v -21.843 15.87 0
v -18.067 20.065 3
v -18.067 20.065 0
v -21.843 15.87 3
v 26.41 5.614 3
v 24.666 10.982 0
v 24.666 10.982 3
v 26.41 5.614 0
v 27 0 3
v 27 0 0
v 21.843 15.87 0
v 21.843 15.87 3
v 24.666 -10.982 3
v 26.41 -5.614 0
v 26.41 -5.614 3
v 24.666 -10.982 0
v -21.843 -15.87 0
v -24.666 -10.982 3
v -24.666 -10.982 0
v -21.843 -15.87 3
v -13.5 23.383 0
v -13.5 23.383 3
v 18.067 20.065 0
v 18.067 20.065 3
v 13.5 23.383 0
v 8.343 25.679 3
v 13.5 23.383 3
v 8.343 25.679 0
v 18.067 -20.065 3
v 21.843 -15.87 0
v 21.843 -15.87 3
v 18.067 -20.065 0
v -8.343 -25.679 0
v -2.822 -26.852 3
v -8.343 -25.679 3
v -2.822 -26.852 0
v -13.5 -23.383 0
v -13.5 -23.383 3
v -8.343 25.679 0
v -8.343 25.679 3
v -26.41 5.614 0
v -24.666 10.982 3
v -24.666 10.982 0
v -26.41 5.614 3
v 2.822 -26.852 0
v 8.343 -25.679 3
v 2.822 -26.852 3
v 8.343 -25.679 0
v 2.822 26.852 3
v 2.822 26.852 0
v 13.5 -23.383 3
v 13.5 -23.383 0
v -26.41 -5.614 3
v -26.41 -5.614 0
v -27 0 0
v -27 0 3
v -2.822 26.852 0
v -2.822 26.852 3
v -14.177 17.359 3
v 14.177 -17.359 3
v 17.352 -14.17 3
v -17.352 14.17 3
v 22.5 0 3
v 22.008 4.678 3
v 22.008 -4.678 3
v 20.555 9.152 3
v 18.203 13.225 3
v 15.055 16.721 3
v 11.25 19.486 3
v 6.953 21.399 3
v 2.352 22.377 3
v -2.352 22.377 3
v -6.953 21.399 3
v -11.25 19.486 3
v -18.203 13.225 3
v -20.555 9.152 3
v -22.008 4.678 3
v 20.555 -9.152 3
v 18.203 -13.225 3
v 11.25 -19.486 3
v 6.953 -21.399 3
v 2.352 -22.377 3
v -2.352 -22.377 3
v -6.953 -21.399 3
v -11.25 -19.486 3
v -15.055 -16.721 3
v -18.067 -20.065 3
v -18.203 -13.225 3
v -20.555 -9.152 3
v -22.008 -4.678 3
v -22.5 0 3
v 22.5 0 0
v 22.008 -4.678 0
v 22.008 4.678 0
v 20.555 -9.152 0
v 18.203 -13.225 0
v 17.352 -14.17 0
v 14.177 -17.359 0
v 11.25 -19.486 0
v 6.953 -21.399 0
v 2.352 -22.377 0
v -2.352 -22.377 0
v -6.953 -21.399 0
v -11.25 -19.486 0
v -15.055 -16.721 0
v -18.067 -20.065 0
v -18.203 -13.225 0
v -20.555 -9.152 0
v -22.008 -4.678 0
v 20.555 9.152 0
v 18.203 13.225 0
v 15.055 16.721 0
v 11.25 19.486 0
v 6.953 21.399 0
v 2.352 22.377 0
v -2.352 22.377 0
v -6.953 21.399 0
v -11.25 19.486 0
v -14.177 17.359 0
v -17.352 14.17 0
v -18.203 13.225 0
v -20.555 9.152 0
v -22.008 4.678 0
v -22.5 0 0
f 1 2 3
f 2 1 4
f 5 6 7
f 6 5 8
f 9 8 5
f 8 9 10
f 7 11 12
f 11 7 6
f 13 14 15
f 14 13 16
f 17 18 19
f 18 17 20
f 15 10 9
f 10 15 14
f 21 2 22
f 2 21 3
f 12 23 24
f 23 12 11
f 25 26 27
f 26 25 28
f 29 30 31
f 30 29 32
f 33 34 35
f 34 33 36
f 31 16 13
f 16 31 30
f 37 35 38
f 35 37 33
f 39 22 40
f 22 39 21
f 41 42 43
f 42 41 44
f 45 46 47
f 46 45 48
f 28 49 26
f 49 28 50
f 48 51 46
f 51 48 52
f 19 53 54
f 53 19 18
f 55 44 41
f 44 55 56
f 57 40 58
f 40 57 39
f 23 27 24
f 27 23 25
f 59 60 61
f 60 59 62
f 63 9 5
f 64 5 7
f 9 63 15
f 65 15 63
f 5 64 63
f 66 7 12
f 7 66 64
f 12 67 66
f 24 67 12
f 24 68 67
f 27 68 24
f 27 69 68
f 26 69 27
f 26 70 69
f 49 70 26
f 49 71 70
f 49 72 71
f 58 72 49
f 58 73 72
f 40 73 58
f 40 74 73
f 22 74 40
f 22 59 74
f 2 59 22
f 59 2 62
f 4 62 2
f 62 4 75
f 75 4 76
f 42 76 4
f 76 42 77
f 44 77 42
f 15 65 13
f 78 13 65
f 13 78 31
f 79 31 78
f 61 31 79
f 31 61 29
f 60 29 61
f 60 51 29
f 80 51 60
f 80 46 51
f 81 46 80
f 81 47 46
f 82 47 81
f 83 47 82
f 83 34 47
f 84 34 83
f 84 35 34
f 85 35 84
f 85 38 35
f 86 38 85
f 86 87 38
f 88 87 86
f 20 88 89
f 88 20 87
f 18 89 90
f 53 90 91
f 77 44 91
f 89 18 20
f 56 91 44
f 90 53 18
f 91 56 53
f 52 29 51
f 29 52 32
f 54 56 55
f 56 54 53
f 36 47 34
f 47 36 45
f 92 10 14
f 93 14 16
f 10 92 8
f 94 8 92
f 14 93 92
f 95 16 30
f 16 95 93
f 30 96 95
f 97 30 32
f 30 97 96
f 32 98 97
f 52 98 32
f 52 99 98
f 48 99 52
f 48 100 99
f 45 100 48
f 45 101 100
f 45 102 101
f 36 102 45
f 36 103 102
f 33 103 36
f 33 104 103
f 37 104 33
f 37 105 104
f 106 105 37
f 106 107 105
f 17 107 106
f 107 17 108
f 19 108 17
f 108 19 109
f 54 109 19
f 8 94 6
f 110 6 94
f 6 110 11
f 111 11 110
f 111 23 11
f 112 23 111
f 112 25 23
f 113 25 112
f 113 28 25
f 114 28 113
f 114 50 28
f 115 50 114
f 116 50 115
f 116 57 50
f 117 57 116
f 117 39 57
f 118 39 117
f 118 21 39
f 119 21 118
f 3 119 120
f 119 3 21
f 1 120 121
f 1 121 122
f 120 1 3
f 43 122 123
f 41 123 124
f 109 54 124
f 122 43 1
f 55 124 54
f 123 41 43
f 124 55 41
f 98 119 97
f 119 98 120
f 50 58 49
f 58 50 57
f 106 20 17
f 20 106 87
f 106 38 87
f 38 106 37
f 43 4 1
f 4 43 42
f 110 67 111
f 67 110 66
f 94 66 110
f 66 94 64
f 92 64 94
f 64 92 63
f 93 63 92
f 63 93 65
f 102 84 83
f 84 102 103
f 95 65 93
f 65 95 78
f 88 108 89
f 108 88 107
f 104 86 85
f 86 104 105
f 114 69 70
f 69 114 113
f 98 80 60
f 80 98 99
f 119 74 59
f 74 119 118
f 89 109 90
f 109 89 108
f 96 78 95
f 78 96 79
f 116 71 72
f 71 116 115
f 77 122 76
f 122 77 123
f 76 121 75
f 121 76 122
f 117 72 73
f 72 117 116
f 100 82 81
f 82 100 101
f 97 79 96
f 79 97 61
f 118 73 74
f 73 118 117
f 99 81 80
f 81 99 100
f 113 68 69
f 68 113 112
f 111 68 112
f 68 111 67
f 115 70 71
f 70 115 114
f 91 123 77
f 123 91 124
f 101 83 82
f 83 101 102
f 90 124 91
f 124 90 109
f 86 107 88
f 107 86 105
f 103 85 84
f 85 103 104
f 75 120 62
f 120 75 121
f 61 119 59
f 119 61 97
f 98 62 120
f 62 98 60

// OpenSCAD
union() {
	difference() {
		cylinder(h = 3.0, r = 27.0);
		cylinder(h = 3.0, r = 22.5);
	}
	rotate(a = [0, 0, -45]) {
		translate(v = [-24.75, 0, 0]) {
			translate(v = [0, -2.25, 0]) {
				cube(size = [49.5, 4.5, 3.0]);
			}
		}
	}
}
